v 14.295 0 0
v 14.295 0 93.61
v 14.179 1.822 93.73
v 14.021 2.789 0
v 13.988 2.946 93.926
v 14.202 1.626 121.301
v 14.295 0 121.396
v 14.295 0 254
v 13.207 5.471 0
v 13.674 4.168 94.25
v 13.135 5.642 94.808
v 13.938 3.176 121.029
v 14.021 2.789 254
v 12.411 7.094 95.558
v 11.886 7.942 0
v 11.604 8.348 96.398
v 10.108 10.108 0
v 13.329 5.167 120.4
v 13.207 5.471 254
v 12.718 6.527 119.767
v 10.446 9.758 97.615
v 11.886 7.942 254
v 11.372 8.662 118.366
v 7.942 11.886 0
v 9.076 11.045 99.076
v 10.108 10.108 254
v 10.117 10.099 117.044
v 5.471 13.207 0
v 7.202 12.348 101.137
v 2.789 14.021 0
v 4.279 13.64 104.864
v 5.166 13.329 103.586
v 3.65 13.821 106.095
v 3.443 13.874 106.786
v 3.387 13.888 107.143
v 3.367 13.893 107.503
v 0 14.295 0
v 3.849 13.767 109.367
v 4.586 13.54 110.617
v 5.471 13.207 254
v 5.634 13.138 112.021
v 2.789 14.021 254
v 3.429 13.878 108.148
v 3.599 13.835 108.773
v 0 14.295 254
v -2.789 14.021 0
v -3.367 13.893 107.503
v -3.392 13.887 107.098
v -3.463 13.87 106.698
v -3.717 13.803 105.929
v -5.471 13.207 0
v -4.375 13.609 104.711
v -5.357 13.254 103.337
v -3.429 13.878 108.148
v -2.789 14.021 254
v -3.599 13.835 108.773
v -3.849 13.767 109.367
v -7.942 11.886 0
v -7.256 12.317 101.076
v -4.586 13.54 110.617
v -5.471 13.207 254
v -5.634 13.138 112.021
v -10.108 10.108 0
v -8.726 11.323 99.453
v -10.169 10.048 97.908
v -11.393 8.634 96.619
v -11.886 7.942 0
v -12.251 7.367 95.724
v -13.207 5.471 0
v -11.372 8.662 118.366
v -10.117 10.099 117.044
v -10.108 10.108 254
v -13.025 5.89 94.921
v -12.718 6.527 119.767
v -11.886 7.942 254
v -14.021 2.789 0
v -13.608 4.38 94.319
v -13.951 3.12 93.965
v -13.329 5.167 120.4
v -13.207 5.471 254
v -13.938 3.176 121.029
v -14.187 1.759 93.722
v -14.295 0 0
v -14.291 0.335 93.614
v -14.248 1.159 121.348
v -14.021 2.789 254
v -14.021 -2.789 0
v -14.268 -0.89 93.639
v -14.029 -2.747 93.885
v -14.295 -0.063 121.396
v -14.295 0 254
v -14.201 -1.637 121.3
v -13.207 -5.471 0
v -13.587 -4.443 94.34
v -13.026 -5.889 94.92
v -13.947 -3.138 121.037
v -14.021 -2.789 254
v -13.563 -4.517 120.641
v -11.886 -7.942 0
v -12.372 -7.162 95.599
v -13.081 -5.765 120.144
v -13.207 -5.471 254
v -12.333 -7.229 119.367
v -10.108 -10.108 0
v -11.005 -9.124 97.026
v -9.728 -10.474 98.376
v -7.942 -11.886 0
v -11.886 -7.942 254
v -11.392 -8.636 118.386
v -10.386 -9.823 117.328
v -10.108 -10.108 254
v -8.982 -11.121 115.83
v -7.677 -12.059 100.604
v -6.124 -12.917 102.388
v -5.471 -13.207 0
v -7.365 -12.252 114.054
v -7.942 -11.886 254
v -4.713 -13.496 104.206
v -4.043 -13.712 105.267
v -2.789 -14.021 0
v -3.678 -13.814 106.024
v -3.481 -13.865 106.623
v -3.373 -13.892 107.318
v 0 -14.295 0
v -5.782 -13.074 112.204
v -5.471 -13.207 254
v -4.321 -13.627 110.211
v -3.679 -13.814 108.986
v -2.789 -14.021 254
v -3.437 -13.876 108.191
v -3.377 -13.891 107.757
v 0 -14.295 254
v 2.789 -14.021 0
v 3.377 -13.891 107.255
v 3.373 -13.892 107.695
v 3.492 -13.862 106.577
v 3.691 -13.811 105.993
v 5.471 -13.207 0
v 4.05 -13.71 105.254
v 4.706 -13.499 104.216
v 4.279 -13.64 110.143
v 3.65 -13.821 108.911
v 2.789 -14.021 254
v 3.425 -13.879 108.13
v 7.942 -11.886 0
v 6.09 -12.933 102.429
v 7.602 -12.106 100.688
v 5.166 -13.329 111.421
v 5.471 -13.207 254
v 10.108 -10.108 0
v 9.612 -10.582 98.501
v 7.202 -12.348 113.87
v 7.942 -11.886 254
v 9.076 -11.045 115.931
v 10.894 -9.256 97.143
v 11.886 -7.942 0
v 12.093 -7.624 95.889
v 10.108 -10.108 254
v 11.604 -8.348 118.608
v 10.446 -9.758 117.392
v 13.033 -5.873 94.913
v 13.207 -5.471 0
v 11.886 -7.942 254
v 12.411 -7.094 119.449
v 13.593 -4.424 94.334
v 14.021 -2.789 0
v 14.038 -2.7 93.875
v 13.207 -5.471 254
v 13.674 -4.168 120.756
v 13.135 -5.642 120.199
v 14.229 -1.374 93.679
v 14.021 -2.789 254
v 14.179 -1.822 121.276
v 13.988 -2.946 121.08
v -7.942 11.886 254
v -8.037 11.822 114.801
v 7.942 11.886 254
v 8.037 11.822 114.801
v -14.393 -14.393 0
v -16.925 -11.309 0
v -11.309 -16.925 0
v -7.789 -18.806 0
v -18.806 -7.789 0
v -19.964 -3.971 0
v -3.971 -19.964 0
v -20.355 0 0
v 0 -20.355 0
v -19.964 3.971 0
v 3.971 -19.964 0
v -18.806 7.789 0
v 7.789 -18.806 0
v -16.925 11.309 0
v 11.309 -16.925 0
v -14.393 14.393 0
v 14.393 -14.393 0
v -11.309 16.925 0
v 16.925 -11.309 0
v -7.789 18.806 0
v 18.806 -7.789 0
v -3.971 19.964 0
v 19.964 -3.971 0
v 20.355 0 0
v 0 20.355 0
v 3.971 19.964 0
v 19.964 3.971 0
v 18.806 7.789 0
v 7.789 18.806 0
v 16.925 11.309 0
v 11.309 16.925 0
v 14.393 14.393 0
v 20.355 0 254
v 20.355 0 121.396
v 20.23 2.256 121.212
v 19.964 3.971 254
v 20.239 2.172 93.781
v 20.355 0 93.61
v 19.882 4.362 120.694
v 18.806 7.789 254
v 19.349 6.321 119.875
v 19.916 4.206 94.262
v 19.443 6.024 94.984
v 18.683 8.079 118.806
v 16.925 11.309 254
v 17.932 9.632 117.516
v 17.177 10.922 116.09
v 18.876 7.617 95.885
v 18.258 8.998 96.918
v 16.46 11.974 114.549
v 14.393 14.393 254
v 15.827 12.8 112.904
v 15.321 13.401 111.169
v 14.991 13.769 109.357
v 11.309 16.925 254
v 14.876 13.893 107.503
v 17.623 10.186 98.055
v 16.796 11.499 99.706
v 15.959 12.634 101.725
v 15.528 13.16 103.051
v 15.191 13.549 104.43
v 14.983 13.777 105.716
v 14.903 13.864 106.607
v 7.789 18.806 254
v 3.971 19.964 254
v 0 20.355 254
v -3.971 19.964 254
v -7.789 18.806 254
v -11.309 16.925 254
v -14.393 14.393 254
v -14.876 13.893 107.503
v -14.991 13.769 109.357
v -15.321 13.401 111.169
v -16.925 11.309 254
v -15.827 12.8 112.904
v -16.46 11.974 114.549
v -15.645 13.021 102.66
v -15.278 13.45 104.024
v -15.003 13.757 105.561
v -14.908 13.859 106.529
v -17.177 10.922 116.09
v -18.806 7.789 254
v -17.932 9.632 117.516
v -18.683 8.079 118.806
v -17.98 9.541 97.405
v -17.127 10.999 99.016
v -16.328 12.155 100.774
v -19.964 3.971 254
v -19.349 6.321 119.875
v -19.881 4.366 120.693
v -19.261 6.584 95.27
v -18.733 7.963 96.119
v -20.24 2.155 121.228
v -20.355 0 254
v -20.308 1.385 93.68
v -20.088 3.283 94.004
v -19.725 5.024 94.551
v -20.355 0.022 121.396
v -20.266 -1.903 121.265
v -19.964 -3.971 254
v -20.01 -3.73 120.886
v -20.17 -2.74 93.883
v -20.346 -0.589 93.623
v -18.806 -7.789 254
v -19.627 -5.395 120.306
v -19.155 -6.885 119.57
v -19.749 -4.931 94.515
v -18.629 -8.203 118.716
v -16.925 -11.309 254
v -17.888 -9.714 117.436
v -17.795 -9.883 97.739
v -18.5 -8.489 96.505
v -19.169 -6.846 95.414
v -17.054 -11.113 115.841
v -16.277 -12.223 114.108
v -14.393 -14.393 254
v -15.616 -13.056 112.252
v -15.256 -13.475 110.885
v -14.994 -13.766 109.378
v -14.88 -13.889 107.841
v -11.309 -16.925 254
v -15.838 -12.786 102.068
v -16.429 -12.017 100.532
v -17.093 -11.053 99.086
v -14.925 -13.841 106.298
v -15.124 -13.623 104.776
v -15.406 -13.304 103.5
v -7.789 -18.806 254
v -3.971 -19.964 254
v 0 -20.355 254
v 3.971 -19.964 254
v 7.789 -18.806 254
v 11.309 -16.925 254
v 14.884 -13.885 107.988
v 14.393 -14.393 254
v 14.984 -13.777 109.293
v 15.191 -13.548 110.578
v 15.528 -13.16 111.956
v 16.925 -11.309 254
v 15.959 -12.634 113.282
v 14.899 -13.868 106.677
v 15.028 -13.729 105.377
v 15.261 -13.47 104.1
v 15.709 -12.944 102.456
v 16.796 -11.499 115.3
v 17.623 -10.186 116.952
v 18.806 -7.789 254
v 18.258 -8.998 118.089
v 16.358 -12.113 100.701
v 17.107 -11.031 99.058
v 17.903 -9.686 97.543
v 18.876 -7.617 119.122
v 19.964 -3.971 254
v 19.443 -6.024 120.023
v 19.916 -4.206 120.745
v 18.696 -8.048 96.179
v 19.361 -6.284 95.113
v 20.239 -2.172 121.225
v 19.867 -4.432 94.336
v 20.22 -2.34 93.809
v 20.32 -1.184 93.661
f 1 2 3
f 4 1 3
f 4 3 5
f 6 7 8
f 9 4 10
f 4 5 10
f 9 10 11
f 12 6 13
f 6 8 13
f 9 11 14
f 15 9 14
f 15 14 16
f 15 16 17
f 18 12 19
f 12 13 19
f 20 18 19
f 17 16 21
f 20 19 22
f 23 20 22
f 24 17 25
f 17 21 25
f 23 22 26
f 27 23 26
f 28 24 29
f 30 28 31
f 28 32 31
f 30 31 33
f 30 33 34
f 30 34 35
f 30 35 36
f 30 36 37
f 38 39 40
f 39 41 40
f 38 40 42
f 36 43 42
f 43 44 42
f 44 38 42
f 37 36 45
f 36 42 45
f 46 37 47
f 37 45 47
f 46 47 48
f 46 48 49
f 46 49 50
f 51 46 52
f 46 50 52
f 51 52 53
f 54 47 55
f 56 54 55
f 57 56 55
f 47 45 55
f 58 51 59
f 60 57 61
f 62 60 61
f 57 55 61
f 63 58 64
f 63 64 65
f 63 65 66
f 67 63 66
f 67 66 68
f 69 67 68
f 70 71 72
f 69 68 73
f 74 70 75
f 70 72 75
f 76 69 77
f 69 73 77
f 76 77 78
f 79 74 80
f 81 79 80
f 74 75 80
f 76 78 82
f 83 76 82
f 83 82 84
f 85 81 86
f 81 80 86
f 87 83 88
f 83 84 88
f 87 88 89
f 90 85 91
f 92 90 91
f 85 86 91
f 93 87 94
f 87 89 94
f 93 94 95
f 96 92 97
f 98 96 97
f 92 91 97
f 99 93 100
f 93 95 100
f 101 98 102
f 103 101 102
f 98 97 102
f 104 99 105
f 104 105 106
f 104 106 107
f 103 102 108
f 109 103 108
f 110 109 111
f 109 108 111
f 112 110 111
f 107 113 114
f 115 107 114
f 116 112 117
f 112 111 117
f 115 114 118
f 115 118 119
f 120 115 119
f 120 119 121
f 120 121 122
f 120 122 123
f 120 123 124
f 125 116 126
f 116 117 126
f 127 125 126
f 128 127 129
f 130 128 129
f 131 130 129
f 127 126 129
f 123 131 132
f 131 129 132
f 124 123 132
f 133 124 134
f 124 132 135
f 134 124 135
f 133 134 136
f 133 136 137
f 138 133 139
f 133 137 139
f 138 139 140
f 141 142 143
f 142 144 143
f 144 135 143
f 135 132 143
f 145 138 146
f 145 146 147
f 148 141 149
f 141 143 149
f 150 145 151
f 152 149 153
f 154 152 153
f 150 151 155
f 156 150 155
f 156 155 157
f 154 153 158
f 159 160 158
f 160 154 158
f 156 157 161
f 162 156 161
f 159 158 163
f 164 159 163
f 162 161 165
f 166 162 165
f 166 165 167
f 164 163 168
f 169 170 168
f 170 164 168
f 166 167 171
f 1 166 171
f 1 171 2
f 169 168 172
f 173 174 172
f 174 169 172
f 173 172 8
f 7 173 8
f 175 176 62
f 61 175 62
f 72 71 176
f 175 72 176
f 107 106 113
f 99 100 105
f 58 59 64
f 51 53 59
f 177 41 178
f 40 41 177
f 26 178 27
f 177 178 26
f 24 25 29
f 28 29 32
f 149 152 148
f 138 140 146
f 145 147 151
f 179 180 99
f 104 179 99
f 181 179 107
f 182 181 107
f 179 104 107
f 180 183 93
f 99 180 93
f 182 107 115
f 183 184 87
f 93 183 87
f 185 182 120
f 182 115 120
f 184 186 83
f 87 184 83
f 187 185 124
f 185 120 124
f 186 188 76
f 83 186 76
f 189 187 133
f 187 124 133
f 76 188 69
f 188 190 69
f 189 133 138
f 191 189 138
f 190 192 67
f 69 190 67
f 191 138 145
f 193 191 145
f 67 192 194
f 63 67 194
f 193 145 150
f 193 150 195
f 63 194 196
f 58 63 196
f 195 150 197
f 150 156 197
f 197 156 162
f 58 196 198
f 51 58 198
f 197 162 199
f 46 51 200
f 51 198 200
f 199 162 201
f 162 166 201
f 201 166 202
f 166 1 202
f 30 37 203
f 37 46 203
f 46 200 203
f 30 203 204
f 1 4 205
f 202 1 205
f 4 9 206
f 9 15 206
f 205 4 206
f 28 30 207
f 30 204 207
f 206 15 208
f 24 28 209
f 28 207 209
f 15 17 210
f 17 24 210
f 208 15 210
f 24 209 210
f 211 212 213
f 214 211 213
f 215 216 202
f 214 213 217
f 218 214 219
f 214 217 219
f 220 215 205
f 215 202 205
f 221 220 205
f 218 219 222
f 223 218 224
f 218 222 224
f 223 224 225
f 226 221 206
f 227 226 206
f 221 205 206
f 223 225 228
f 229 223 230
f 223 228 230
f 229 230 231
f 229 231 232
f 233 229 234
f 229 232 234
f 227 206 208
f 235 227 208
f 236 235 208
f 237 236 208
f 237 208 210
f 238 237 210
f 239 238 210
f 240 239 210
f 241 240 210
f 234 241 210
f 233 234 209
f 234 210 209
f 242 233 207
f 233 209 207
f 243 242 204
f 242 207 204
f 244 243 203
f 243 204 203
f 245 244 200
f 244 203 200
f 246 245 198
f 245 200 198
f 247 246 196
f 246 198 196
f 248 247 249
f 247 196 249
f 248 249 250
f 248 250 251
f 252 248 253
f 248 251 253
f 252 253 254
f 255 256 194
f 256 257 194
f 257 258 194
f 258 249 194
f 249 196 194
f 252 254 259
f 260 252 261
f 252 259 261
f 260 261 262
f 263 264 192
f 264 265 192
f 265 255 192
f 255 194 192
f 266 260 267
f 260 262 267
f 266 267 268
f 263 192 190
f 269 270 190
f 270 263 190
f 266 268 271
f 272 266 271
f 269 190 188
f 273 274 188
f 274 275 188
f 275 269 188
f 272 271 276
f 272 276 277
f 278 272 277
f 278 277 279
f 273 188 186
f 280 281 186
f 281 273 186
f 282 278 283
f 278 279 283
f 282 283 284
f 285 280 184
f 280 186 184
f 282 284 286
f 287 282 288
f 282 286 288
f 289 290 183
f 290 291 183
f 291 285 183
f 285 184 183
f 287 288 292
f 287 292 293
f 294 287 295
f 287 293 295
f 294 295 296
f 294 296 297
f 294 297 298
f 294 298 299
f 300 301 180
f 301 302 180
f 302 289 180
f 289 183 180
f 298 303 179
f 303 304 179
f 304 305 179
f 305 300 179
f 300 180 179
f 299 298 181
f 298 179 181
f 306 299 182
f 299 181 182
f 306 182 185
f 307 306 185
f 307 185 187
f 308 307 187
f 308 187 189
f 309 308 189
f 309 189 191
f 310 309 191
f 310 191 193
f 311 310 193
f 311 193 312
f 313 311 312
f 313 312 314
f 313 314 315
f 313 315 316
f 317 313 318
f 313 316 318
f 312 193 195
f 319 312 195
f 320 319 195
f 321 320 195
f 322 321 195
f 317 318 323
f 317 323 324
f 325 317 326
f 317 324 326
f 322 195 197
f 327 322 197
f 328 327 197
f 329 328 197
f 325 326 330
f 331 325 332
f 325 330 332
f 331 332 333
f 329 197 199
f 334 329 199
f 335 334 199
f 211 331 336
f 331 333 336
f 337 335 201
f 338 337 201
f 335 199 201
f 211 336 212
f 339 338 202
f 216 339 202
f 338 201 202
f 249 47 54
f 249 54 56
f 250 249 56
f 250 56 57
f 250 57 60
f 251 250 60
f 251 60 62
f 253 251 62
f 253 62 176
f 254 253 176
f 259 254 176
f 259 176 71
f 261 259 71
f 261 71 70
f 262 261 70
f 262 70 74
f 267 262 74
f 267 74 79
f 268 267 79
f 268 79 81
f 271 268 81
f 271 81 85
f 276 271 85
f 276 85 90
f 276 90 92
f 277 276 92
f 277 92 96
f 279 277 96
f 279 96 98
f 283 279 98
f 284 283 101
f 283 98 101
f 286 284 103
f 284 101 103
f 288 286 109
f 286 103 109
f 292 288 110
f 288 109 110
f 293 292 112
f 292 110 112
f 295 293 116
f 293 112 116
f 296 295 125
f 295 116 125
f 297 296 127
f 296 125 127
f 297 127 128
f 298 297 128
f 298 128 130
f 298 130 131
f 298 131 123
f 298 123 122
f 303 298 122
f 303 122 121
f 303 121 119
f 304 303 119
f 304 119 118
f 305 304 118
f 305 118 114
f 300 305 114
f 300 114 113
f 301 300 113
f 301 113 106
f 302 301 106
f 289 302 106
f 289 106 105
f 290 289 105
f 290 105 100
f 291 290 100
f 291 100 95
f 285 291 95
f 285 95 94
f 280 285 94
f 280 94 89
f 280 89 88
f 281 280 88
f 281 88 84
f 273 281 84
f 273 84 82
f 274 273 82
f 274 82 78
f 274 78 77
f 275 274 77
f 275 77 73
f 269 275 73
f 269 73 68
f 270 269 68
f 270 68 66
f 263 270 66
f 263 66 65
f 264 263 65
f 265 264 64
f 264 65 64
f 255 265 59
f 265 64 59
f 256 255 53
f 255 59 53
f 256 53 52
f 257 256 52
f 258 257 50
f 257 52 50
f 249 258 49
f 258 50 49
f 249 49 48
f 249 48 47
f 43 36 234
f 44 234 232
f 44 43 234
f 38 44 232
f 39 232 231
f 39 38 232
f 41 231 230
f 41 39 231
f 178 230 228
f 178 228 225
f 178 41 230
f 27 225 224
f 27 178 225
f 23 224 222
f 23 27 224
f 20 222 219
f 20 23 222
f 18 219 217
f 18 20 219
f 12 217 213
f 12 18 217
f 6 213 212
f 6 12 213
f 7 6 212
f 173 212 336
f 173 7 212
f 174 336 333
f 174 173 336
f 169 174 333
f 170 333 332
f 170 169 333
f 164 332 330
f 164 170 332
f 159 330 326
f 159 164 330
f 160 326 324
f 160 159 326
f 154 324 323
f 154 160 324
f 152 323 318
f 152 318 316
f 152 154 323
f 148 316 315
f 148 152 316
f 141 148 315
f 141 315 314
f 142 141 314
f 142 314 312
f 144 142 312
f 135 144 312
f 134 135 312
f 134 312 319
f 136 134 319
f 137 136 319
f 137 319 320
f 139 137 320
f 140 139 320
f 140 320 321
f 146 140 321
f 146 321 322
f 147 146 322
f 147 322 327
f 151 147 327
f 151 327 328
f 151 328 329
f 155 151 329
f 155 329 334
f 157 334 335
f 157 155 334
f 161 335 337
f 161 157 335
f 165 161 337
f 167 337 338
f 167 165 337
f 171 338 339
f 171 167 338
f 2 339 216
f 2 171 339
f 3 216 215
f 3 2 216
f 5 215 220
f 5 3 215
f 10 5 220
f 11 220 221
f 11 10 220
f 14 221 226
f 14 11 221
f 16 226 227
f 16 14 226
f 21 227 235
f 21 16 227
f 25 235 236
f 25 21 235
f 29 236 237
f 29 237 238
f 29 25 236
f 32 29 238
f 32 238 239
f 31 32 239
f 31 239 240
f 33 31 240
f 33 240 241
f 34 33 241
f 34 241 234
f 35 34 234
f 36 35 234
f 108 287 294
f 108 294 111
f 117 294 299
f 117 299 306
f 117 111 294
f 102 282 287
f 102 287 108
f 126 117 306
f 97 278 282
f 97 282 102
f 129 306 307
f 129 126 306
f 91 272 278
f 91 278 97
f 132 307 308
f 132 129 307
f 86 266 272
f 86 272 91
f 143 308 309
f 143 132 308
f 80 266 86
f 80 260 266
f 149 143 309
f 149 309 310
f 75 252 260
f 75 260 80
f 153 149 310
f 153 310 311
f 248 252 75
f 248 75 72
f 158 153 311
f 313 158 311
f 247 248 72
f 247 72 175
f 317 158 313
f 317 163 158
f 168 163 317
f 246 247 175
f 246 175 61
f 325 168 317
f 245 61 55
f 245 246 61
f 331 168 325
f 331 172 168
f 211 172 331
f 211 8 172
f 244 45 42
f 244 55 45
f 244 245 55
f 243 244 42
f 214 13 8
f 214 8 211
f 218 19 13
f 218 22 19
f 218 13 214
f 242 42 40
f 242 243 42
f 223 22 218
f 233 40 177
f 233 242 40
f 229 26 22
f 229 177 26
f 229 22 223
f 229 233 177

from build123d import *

# Parameters (mm, degrees)
F0_R          = 20.3549318645
F1_DEPTH      = 254
F2_R          = 14.2952527041
F3_DEPTH      = 254.001
F4_R          = 13.8929709209
F5_DEPTH      = 20.3559318645
F5_DEPTH_BACK = 25.4


with BuildPart() as f1:
    # F0 (on Top) → F1 (new body)
    with BuildSketch(Plane.XY):
        Circle(F0_R)
    extrude(amount=F1_DEPTH)

    # F2 (on face) → F3 (cut, through all)
    with BuildSketch(Plane.XY.offset(254)):
        Circle(F2_R)
    extrude(amount=-F3_DEPTH, mode=Mode.SUBTRACT)

    # F4 (on Right) → F5 (cut, two sides)
    with BuildSketch(Plane.YZ) as f5_sk:
        with Locations((0, 107.5033918023)):
            Circle(F4_R)
    extrude(amount=-F5_DEPTH, mode=Mode.SUBTRACT)
    extrude(f5_sk.sketch, amount=F5_DEPTH_BACK, mode=Mode.SUBTRACT)


solid = f1.part
